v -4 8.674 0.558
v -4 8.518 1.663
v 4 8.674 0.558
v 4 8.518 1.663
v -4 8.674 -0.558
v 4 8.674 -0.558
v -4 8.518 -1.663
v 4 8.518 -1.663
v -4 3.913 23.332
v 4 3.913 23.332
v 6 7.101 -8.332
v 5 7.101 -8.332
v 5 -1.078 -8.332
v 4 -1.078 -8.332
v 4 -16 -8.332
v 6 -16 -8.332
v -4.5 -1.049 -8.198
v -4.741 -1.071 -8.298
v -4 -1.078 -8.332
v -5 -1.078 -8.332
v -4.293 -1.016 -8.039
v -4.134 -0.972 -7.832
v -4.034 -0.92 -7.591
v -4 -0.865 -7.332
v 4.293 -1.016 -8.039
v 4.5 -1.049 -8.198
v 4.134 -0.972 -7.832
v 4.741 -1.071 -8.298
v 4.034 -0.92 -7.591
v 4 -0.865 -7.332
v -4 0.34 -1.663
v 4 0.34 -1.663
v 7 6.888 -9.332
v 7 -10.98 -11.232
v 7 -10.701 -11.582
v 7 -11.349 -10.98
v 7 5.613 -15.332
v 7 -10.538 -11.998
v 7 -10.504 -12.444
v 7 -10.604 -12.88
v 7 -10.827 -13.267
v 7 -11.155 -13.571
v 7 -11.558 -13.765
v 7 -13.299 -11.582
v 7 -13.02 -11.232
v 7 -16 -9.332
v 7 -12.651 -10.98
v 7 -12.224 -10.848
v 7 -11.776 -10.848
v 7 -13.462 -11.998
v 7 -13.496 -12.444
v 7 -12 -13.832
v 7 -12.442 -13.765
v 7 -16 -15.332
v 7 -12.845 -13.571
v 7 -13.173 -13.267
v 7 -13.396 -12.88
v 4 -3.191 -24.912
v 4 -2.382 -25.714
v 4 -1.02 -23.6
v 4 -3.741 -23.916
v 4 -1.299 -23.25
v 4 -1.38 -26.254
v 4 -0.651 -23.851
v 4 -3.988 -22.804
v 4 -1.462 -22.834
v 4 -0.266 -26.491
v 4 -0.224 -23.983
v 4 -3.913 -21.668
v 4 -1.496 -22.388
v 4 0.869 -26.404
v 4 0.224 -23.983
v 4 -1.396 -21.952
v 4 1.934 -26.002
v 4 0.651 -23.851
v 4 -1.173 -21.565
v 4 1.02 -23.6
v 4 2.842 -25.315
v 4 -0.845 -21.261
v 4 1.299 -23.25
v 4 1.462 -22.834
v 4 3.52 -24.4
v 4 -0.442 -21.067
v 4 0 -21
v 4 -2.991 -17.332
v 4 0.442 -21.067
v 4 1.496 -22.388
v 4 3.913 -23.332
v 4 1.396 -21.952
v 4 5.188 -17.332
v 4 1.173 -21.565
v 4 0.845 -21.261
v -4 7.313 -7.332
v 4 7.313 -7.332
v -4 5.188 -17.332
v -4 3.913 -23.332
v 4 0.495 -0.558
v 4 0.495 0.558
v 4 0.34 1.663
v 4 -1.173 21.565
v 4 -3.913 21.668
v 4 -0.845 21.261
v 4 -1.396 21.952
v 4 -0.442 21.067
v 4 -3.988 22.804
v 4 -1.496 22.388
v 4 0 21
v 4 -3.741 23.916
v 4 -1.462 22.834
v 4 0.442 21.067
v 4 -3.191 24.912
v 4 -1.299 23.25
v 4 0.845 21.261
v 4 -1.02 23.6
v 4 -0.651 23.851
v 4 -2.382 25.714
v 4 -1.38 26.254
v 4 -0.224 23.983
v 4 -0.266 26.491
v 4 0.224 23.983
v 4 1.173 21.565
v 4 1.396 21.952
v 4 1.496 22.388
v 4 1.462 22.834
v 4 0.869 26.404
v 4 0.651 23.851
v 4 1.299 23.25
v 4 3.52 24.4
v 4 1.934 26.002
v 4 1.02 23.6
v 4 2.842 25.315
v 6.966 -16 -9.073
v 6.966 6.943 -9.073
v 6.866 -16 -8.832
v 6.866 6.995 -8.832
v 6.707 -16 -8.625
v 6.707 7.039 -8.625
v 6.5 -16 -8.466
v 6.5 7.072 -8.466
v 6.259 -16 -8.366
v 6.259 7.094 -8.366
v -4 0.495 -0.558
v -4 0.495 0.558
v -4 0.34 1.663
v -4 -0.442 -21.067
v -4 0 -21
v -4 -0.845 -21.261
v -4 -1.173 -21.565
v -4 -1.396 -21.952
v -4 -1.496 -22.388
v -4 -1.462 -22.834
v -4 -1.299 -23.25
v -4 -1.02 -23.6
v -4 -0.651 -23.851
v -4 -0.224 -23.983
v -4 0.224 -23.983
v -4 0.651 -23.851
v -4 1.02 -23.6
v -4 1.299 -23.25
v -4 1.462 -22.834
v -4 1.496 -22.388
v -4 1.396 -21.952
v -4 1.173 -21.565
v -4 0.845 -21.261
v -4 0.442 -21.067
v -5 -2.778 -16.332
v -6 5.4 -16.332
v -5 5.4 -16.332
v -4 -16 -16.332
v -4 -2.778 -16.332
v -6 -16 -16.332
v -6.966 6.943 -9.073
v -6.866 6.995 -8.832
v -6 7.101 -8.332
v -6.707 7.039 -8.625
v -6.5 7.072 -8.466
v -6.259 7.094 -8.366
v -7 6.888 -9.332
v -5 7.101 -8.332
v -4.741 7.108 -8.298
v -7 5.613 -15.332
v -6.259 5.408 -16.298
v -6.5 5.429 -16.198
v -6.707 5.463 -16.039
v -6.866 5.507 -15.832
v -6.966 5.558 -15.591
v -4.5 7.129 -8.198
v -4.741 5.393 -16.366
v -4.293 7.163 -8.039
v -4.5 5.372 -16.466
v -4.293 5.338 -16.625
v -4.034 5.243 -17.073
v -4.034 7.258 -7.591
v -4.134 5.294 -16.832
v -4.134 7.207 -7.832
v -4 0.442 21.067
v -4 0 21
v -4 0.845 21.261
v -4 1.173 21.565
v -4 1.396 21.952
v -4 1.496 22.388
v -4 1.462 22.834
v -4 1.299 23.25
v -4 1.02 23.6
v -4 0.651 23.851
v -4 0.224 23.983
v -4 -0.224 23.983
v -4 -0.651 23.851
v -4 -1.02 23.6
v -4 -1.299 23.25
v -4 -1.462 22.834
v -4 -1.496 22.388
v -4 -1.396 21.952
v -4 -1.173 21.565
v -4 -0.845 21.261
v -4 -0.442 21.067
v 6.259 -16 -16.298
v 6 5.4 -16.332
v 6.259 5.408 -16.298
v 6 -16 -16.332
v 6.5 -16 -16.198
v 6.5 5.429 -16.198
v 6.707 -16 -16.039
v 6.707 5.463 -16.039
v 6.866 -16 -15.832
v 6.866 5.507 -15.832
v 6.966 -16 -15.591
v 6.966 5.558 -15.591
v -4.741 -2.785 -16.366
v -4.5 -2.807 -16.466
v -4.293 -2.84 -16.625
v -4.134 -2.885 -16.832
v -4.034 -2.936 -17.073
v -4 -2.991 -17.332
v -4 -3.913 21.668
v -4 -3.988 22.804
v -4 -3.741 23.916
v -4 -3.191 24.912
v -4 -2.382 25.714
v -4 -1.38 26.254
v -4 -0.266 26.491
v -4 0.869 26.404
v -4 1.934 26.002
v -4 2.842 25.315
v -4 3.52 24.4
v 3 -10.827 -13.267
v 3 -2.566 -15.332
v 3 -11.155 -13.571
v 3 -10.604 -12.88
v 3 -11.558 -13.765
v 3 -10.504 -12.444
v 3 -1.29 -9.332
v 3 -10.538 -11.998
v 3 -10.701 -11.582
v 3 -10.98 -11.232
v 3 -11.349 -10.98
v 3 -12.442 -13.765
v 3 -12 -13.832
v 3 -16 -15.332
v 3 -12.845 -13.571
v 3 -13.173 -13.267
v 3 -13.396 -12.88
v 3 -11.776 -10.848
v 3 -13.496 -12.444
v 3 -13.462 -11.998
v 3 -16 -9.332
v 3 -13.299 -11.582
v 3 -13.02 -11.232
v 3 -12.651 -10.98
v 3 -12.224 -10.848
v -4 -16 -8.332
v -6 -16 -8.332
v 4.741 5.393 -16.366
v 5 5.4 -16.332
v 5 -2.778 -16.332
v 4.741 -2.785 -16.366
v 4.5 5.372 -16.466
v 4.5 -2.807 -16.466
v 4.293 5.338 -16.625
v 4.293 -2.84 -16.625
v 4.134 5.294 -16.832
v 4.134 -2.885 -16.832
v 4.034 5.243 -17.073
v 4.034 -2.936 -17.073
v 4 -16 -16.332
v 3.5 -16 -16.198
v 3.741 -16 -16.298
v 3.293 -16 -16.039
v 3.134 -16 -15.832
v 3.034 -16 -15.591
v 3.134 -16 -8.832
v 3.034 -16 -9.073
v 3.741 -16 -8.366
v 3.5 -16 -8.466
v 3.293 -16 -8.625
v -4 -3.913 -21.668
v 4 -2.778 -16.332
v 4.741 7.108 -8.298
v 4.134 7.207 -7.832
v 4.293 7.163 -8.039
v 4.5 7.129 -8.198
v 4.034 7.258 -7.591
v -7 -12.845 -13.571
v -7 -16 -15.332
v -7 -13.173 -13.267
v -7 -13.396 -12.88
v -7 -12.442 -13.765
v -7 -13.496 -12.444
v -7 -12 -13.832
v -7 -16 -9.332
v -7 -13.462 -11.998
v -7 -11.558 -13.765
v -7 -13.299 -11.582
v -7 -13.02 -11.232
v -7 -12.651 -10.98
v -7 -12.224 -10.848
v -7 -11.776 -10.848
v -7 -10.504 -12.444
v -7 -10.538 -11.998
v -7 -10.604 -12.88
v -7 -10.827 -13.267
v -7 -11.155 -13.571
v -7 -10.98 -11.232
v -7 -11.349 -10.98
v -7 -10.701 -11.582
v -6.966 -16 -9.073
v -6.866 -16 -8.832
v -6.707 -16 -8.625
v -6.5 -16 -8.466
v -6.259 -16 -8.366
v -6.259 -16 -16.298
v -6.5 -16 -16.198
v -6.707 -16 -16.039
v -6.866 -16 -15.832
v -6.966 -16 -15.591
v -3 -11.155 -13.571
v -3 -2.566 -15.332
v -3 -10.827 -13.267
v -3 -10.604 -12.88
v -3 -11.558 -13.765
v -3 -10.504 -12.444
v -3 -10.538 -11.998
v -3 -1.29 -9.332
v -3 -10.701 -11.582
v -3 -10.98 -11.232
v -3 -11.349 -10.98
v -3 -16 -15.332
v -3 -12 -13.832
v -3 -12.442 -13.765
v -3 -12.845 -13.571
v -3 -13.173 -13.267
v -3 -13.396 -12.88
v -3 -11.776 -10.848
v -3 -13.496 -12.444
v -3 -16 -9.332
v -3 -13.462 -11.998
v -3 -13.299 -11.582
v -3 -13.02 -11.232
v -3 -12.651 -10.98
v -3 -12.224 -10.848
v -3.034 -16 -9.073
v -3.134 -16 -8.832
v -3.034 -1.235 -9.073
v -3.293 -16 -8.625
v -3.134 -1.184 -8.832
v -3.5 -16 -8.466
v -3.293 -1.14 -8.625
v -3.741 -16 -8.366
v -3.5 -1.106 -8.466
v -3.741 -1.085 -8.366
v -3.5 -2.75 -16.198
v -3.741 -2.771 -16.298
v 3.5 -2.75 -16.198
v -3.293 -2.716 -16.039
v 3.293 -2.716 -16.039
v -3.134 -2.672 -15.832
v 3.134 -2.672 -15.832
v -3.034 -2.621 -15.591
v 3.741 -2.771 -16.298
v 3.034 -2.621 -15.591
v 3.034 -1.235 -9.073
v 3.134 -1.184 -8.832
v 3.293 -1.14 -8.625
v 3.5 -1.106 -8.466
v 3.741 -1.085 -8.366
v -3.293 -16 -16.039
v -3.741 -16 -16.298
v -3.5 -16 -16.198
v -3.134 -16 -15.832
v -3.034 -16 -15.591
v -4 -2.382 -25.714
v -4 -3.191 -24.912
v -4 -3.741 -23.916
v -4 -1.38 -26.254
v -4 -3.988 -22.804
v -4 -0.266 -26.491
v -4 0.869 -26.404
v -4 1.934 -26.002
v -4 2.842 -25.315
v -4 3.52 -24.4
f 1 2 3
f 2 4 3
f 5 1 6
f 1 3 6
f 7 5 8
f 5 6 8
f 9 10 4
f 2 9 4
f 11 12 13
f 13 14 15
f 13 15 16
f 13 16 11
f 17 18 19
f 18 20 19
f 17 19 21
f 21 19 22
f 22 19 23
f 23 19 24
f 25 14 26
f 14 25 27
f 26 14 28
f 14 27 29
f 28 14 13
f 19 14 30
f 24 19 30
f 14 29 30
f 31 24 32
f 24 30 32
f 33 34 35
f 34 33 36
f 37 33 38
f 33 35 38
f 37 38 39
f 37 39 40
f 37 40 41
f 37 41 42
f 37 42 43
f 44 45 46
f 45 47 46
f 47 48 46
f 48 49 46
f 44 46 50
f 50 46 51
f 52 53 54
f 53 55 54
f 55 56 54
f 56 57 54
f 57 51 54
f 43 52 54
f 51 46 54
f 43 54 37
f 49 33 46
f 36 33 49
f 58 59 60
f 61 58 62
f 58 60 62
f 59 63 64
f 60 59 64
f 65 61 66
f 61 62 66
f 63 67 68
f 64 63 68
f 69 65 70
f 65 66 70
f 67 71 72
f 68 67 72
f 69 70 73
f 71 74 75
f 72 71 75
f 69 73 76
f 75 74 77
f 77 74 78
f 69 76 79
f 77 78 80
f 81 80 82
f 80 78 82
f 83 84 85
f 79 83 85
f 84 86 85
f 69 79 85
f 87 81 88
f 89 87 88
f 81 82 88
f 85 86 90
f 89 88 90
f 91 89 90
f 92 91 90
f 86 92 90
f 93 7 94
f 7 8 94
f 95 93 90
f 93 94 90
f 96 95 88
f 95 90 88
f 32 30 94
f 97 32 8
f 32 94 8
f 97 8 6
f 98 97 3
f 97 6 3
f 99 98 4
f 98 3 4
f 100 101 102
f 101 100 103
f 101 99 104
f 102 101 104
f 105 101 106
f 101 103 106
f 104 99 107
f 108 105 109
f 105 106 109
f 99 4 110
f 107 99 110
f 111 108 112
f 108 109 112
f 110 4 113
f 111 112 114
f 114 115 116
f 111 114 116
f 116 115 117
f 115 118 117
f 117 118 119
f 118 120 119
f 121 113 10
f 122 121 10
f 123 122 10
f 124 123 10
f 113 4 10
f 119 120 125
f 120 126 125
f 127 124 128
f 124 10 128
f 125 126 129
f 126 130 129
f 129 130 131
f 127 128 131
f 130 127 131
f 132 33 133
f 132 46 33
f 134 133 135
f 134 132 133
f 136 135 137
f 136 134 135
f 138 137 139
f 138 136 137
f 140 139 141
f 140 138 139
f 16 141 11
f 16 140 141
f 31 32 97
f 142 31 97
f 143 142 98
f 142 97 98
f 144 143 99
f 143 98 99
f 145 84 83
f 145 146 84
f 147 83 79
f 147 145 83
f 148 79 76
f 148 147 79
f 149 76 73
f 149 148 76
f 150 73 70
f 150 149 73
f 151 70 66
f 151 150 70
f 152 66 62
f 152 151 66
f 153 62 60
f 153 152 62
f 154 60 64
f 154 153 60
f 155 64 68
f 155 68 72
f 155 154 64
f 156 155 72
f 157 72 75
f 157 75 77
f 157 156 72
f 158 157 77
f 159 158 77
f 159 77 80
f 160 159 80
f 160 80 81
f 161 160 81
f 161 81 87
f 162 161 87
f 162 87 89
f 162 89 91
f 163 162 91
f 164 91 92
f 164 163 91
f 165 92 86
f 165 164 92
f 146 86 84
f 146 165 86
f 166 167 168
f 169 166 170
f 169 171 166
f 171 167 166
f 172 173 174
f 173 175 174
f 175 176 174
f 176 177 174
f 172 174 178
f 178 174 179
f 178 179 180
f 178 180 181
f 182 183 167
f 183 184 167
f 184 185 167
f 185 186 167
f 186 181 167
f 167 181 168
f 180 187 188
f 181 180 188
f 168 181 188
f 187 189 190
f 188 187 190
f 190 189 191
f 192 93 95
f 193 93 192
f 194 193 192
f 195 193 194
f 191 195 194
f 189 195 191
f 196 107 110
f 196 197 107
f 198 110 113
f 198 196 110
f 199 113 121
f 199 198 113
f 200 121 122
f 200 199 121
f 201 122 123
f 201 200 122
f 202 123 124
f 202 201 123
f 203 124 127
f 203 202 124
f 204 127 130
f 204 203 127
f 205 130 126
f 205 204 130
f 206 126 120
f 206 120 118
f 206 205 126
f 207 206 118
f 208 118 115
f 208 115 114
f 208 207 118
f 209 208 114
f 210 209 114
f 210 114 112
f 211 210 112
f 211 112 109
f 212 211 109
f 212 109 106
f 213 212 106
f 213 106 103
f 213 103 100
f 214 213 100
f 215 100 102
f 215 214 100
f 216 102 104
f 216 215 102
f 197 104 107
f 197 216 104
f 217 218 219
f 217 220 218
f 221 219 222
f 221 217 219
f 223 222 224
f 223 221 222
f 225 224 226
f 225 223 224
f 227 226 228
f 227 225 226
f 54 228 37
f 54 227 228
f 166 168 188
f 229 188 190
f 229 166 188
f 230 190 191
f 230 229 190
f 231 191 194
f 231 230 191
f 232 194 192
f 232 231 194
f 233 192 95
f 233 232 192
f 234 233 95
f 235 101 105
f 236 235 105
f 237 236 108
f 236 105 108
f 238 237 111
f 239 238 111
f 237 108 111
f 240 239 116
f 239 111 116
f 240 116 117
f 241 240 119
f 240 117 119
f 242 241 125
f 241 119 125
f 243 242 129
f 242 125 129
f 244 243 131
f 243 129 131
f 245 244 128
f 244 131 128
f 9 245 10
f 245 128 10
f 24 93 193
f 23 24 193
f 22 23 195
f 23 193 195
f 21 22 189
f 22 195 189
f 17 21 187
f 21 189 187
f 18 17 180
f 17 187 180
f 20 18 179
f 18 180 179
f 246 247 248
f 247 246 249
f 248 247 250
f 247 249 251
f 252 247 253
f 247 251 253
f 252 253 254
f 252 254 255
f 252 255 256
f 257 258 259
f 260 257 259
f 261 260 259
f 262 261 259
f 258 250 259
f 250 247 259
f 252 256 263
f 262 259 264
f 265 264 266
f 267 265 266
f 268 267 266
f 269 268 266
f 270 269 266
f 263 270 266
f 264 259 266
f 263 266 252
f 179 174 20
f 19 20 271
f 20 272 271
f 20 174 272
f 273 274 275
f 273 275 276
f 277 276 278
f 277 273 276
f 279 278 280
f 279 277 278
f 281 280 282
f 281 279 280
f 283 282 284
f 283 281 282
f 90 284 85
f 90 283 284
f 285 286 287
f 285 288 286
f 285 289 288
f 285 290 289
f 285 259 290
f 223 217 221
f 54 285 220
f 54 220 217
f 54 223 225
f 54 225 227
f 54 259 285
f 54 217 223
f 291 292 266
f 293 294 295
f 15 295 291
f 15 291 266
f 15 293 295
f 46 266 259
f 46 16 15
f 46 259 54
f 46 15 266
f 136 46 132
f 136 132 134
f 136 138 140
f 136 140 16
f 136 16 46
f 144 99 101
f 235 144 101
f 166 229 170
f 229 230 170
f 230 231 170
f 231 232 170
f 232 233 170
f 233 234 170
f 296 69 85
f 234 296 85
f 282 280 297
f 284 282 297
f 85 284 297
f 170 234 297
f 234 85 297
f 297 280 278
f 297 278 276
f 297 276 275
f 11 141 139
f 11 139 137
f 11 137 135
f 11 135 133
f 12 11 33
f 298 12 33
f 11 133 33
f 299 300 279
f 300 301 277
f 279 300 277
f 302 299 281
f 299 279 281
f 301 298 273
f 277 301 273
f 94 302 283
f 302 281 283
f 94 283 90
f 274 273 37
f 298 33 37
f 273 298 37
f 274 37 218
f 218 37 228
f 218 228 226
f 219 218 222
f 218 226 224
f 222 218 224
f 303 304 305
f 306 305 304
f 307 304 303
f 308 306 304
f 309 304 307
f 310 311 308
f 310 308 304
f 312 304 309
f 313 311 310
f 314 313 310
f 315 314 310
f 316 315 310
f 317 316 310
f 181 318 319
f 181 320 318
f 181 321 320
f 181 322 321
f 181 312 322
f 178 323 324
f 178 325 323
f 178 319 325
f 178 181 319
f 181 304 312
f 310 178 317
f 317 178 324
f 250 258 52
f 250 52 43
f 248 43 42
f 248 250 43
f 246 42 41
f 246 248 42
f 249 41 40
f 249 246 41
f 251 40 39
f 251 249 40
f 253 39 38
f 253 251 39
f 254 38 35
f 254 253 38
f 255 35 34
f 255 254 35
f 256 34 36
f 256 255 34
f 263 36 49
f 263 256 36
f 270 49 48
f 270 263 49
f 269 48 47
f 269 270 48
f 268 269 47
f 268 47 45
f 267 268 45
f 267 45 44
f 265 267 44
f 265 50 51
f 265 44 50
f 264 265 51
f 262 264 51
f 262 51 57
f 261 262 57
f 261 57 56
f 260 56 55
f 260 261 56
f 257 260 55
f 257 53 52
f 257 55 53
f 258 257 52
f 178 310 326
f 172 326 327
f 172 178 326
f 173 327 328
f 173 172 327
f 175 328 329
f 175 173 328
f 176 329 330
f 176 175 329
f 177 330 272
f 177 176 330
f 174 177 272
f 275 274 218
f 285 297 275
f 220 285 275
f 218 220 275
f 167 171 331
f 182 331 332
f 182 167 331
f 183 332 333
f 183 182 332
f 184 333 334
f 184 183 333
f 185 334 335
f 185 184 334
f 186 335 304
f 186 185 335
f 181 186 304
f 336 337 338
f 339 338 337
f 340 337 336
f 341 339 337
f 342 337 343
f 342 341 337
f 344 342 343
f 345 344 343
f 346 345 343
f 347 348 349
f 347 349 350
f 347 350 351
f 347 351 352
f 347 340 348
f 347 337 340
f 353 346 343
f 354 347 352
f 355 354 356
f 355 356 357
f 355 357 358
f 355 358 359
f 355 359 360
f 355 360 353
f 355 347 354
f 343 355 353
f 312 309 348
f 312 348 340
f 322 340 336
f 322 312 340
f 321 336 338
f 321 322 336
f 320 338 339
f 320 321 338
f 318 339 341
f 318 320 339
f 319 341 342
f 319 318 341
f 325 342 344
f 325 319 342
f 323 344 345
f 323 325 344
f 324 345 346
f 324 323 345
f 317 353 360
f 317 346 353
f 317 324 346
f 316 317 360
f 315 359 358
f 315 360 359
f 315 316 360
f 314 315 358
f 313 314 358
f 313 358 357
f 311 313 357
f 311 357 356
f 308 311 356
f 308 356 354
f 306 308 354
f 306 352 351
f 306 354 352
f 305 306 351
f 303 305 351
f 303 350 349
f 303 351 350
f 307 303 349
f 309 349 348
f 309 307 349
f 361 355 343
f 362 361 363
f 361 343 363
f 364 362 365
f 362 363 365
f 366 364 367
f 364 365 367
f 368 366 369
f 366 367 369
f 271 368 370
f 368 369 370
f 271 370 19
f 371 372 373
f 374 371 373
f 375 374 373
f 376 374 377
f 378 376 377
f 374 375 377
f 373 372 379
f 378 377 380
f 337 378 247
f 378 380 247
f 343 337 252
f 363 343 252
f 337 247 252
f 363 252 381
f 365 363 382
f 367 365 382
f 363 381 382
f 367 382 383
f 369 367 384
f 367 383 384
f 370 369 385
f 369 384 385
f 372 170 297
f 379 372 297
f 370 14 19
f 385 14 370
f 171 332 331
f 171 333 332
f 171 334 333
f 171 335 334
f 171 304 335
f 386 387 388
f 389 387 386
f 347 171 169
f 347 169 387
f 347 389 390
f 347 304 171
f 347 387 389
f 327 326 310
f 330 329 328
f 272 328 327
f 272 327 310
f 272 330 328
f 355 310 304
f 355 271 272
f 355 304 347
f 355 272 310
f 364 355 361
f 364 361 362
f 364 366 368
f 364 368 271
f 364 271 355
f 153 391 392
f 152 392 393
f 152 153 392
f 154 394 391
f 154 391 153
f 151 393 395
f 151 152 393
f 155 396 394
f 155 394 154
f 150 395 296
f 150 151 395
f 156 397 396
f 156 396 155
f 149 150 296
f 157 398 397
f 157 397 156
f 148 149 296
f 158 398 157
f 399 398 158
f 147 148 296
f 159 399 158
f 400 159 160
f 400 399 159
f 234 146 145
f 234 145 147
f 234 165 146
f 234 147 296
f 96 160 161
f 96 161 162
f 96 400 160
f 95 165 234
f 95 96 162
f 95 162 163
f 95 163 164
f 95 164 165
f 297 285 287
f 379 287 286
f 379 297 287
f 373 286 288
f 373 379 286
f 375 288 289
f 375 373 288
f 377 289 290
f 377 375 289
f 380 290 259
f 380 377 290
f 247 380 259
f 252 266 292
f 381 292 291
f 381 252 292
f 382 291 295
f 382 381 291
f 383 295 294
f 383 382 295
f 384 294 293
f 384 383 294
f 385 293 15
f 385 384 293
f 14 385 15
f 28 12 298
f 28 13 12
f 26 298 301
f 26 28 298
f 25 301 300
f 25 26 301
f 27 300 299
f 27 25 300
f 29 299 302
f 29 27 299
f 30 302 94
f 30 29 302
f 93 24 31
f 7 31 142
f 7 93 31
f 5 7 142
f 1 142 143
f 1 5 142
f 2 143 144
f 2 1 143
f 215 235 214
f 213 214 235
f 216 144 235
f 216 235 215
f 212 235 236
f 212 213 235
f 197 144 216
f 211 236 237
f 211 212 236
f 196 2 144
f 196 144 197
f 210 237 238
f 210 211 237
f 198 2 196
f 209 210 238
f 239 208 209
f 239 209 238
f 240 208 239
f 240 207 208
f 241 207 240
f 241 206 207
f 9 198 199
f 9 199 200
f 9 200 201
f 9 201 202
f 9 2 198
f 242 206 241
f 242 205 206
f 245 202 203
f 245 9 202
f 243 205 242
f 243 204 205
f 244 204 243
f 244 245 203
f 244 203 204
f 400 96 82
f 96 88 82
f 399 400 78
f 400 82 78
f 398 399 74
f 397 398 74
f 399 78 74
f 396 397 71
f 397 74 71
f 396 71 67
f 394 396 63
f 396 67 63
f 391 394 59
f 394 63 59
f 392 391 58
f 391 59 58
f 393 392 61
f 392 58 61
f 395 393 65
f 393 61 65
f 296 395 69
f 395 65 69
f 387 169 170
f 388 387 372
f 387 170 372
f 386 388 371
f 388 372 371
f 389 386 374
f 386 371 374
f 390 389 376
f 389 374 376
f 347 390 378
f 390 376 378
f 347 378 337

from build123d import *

# Parameters (mm, degrees)
CROQUIS1_R                          = 1.5
SALIENTE_EXTRUIR1_DEPTH             = 4
SALIENTE_EXTRUIR2_REACH             = 30.175
CROQUIS3_W                          = 3
CROQUIS3_H                          = 8
SALIENTE_EXTRUIR2_DIRECTION_2_REACH = 30.175
CROQUIS4_W                          = 14
CROQUIS4_H                          = 8
SALIENTE_EXTRUIR3_DEPTH             = 16
CORTAR_EXTRUIR2_REACH               = 38.892
CROQUIS7_W                          = 6
CROQUIS7_H                          = 8
REDONDEO1_R                         = 1
CORTAR_EXTRUIR1_DEPTH               = 32.737202145
CORTAR_EXTRUIR1_DEPTH_BACK          = 32.737202145
CROQUIS6_R                          = 1.5


with BuildPart() as part:
    # Croquis1 → Saliente-Extruir1 (new, symmetric)
    with BuildSketch(Plane(origin=(0, 0, 0), x_dir=(0, 0, -1), z_dir=(1, 0, 0))):
        with BuildLine():
            Line((-23.331646763, 3.912590403), (-1.663293527, 8.518341064))
            ThreePointArc((-1.663293527, 8.518341064), (0, 8.693160258), (1.663293527, 8.518341064))
            Line((1.663293527, 8.518341064), (23.331646763, 3.912590403))
            ThreePointArc((23.331646763, 3.912590403), (26.412590403, -0.831646763), (21.668353237, -3.912590403))
            Line((21.668353237, -3.912590403), (1.663293527, 0.339616305))
            ThreePointArc((1.663293527, 0.339616305), (0, 0.514435499), (-1.663293527, 0.339616305))
            Line((-1.663293527, 0.339616305), (-21.668353237, -3.912590403))
            ThreePointArc((-21.668353237, -3.912590403), (-26.412590403, -0.831646763), (-23.331646763, 3.912590403))
        make_face()
        with Locations((-22.5, 0)):
            Circle(CROQUIS1_R, mode=Mode.SUBTRACT)
        with Locations(Location((22.5, 0, 0), (0, 0, 180))):
            Circle(CROQUIS1_R, mode=Mode.SUBTRACT)
    extrude(amount=SALIENTE_EXTRUIR1_DEPTH, both=True)

    # Saliente-Extruir2: up to this plane
    saliente_extruir2_end = Plane(origin=(4, 0.339616305, -1.663293527), z_dir=(0, 0.9781476007338056, -0.20791169081776))
    # Croquis3 → Saliente-Extruir2 (add, up to the surface)
    with BuildSketch(Plane(origin=(0, 0, 0), x_dir=(1, 0, 0), z_dir=(0, 1, 0)), mode=Mode.PRIVATE) as saliente_extruir2_sk1:
        with Locations((-5.5, 12.331646763)):
            Rectangle(CROQUIS3_W, CROQUIS3_H)
    saliente_extruir2_tool1 = split(extrude(saliente_extruir2_sk1.sketch, amount=-SALIENTE_EXTRUIR2_REACH, mode=Mode.PRIVATE), bisect_by=saliente_extruir2_end, keep=Keep.BOTH, mode=Mode.PRIVATE)
    add(saliente_extruir2_tool1.solids().sort_by_distance((-5.5, 0, -12.331647))[0])
    # Croquis3 → Saliente-Extruir2 (add, up to the surface)
    with BuildSketch(Plane(origin=(0, 0, 0), x_dir=(1, 0, 0), z_dir=(0, 1, 0)), mode=Mode.PRIVATE) as saliente_extruir2_sk2:
        with Locations((5.5, 12.331646763)):
            Rectangle(CROQUIS3_W, CROQUIS3_H)
    saliente_extruir2_tool2 = split(extrude(saliente_extruir2_sk2.sketch, amount=-SALIENTE_EXTRUIR2_REACH, mode=Mode.PRIVATE), bisect_by=saliente_extruir2_end, keep=Keep.BOTH, mode=Mode.PRIVATE)
    add(saliente_extruir2_tool2.solids().sort_by_distance((5.5, 0, -12.331647))[0])

    # Saliente-Extruir2 direction 2: up to this plane
    saliente_extruir2_direction_2_end = Plane(origin=(4, 8.518341064, -1.663293527), z_dir=(0, -0.9781476007338056, 0.20791169081776004))
    # Croquis3 → Saliente-Extruir2 direction 2 (add, up to the surface)
    with BuildSketch(Plane(origin=(0, 0, 0), x_dir=(1, 0, 0), z_dir=(0, 1, 0)), mode=Mode.PRIVATE) as saliente_extruir2_direction_2_sk1:
        with Locations((-5.5, 12.331646763)):
            Rectangle(CROQUIS3_W, CROQUIS3_H)
    saliente_extruir2_direction_2_tool1 = split(extrude(saliente_extruir2_direction_2_sk1.sketch, amount=SALIENTE_EXTRUIR2_DIRECTION_2_REACH, mode=Mode.PRIVATE), bisect_by=saliente_extruir2_direction_2_end, keep=Keep.BOTH, mode=Mode.PRIVATE)
    add(saliente_extruir2_direction_2_tool1.solids().sort_by_distance((-5.5, 0, -12.331647))[0])
    # Croquis3 → Saliente-Extruir2 direction 2 (add, up to the surface)
    with BuildSketch(Plane(origin=(0, 0, 0), x_dir=(1, 0, 0), z_dir=(0, 1, 0)), mode=Mode.PRIVATE) as saliente_extruir2_direction_2_sk2:
        with Locations((5.5, 12.331646763)):
            Rectangle(CROQUIS3_W, CROQUIS3_H)
    saliente_extruir2_direction_2_tool2 = split(extrude(saliente_extruir2_direction_2_sk2.sketch, amount=SALIENTE_EXTRUIR2_DIRECTION_2_REACH, mode=Mode.PRIVATE), bisect_by=saliente_extruir2_direction_2_end, keep=Keep.BOTH, mode=Mode.PRIVATE)
    add(saliente_extruir2_direction_2_tool2.solids().sort_by_distance((5.5, 0, -12.331647))[0])

    # Croquis4 → Saliente-Extruir3 (add)
    with BuildSketch(Plane.XZ):
        with Locations((0, -12.331646763)):
            Rectangle(CROQUIS4_W, CROQUIS4_H)
    extrude(amount=SALIENTE_EXTRUIR3_DEPTH)

    # Cortar-Extruir2: up to this plane
    cortar_extruir2_end = Plane(origin=(4, 0.339616305, -1.663293527), z_dir=(0, 0.9781476007338056, -0.20791169081776))
    # Croquis7 → Cortar-Extruir2 (cut, up to the surface)
    with BuildSketch(Plane.XZ.offset(16), mode=Mode.PRIVATE) as cortar_extruir2_sk1:
        with Locations((0, -12.331646763)):
            Rectangle(CROQUIS7_W, CROQUIS7_H)
    cortar_extruir2_tool1 = split(extrude(cortar_extruir2_sk1.sketch, amount=-CORTAR_EXTRUIR2_REACH, mode=Mode.PRIVATE), bisect_by=cortar_extruir2_end, keep=Keep.BOTH, mode=Mode.PRIVATE)
    add(cortar_extruir2_tool1.solids().sort_by_distance((0, -16, -12.331647))[0], mode=Mode.SUBTRACT)

    # Redondeo1
    redondeo1_edges = [part.edges().sort_by_distance(p)[0] for p in [
        (4, 3.011576449, -8.331646763),
        (4, 1.311123955, -16.331646763),
        (-4, 3.011576449, -8.331646763),
        (-4, 1.311123955, -16.331646763),
        (3, -9.389119212, -16.331646763),
        (-3, -9.389119212, -16.331646763),
        (-3, -8.538892965, -8.331646763),
        (3, -8.538892965, -8.331646763),
        (7, -4.449530586, -8.331646763),
        (7, -5.299756833, -16.331646763),
        (-7, -5.299756833, -16.331646763),
        (-7, -4.449530586, -8.331646763),
    ]]
    fillet(redondeo1_edges, radius=REDONDEO1_R - 0.0001)  # a hair under: the kernel refuses the full size

    # Croquis6 → Cortar-Extruir1 (cut, two sides: drawn at the far end of the back side and taken through both)
    with BuildSketch(Plane(origin=(0, 0, 0), x_dir=(0, 0, -1), z_dir=(1, 0, 0)).offset(-CORTAR_EXTRUIR1_DEPTH_BACK)):
        with Locations((12.331646763, -12)):
            Circle(CROQUIS6_R)
    extrude(amount=CORTAR_EXTRUIR1_DEPTH + CORTAR_EXTRUIR1_DEPTH_BACK, mode=Mode.SUBTRACT)


solid = part.part
